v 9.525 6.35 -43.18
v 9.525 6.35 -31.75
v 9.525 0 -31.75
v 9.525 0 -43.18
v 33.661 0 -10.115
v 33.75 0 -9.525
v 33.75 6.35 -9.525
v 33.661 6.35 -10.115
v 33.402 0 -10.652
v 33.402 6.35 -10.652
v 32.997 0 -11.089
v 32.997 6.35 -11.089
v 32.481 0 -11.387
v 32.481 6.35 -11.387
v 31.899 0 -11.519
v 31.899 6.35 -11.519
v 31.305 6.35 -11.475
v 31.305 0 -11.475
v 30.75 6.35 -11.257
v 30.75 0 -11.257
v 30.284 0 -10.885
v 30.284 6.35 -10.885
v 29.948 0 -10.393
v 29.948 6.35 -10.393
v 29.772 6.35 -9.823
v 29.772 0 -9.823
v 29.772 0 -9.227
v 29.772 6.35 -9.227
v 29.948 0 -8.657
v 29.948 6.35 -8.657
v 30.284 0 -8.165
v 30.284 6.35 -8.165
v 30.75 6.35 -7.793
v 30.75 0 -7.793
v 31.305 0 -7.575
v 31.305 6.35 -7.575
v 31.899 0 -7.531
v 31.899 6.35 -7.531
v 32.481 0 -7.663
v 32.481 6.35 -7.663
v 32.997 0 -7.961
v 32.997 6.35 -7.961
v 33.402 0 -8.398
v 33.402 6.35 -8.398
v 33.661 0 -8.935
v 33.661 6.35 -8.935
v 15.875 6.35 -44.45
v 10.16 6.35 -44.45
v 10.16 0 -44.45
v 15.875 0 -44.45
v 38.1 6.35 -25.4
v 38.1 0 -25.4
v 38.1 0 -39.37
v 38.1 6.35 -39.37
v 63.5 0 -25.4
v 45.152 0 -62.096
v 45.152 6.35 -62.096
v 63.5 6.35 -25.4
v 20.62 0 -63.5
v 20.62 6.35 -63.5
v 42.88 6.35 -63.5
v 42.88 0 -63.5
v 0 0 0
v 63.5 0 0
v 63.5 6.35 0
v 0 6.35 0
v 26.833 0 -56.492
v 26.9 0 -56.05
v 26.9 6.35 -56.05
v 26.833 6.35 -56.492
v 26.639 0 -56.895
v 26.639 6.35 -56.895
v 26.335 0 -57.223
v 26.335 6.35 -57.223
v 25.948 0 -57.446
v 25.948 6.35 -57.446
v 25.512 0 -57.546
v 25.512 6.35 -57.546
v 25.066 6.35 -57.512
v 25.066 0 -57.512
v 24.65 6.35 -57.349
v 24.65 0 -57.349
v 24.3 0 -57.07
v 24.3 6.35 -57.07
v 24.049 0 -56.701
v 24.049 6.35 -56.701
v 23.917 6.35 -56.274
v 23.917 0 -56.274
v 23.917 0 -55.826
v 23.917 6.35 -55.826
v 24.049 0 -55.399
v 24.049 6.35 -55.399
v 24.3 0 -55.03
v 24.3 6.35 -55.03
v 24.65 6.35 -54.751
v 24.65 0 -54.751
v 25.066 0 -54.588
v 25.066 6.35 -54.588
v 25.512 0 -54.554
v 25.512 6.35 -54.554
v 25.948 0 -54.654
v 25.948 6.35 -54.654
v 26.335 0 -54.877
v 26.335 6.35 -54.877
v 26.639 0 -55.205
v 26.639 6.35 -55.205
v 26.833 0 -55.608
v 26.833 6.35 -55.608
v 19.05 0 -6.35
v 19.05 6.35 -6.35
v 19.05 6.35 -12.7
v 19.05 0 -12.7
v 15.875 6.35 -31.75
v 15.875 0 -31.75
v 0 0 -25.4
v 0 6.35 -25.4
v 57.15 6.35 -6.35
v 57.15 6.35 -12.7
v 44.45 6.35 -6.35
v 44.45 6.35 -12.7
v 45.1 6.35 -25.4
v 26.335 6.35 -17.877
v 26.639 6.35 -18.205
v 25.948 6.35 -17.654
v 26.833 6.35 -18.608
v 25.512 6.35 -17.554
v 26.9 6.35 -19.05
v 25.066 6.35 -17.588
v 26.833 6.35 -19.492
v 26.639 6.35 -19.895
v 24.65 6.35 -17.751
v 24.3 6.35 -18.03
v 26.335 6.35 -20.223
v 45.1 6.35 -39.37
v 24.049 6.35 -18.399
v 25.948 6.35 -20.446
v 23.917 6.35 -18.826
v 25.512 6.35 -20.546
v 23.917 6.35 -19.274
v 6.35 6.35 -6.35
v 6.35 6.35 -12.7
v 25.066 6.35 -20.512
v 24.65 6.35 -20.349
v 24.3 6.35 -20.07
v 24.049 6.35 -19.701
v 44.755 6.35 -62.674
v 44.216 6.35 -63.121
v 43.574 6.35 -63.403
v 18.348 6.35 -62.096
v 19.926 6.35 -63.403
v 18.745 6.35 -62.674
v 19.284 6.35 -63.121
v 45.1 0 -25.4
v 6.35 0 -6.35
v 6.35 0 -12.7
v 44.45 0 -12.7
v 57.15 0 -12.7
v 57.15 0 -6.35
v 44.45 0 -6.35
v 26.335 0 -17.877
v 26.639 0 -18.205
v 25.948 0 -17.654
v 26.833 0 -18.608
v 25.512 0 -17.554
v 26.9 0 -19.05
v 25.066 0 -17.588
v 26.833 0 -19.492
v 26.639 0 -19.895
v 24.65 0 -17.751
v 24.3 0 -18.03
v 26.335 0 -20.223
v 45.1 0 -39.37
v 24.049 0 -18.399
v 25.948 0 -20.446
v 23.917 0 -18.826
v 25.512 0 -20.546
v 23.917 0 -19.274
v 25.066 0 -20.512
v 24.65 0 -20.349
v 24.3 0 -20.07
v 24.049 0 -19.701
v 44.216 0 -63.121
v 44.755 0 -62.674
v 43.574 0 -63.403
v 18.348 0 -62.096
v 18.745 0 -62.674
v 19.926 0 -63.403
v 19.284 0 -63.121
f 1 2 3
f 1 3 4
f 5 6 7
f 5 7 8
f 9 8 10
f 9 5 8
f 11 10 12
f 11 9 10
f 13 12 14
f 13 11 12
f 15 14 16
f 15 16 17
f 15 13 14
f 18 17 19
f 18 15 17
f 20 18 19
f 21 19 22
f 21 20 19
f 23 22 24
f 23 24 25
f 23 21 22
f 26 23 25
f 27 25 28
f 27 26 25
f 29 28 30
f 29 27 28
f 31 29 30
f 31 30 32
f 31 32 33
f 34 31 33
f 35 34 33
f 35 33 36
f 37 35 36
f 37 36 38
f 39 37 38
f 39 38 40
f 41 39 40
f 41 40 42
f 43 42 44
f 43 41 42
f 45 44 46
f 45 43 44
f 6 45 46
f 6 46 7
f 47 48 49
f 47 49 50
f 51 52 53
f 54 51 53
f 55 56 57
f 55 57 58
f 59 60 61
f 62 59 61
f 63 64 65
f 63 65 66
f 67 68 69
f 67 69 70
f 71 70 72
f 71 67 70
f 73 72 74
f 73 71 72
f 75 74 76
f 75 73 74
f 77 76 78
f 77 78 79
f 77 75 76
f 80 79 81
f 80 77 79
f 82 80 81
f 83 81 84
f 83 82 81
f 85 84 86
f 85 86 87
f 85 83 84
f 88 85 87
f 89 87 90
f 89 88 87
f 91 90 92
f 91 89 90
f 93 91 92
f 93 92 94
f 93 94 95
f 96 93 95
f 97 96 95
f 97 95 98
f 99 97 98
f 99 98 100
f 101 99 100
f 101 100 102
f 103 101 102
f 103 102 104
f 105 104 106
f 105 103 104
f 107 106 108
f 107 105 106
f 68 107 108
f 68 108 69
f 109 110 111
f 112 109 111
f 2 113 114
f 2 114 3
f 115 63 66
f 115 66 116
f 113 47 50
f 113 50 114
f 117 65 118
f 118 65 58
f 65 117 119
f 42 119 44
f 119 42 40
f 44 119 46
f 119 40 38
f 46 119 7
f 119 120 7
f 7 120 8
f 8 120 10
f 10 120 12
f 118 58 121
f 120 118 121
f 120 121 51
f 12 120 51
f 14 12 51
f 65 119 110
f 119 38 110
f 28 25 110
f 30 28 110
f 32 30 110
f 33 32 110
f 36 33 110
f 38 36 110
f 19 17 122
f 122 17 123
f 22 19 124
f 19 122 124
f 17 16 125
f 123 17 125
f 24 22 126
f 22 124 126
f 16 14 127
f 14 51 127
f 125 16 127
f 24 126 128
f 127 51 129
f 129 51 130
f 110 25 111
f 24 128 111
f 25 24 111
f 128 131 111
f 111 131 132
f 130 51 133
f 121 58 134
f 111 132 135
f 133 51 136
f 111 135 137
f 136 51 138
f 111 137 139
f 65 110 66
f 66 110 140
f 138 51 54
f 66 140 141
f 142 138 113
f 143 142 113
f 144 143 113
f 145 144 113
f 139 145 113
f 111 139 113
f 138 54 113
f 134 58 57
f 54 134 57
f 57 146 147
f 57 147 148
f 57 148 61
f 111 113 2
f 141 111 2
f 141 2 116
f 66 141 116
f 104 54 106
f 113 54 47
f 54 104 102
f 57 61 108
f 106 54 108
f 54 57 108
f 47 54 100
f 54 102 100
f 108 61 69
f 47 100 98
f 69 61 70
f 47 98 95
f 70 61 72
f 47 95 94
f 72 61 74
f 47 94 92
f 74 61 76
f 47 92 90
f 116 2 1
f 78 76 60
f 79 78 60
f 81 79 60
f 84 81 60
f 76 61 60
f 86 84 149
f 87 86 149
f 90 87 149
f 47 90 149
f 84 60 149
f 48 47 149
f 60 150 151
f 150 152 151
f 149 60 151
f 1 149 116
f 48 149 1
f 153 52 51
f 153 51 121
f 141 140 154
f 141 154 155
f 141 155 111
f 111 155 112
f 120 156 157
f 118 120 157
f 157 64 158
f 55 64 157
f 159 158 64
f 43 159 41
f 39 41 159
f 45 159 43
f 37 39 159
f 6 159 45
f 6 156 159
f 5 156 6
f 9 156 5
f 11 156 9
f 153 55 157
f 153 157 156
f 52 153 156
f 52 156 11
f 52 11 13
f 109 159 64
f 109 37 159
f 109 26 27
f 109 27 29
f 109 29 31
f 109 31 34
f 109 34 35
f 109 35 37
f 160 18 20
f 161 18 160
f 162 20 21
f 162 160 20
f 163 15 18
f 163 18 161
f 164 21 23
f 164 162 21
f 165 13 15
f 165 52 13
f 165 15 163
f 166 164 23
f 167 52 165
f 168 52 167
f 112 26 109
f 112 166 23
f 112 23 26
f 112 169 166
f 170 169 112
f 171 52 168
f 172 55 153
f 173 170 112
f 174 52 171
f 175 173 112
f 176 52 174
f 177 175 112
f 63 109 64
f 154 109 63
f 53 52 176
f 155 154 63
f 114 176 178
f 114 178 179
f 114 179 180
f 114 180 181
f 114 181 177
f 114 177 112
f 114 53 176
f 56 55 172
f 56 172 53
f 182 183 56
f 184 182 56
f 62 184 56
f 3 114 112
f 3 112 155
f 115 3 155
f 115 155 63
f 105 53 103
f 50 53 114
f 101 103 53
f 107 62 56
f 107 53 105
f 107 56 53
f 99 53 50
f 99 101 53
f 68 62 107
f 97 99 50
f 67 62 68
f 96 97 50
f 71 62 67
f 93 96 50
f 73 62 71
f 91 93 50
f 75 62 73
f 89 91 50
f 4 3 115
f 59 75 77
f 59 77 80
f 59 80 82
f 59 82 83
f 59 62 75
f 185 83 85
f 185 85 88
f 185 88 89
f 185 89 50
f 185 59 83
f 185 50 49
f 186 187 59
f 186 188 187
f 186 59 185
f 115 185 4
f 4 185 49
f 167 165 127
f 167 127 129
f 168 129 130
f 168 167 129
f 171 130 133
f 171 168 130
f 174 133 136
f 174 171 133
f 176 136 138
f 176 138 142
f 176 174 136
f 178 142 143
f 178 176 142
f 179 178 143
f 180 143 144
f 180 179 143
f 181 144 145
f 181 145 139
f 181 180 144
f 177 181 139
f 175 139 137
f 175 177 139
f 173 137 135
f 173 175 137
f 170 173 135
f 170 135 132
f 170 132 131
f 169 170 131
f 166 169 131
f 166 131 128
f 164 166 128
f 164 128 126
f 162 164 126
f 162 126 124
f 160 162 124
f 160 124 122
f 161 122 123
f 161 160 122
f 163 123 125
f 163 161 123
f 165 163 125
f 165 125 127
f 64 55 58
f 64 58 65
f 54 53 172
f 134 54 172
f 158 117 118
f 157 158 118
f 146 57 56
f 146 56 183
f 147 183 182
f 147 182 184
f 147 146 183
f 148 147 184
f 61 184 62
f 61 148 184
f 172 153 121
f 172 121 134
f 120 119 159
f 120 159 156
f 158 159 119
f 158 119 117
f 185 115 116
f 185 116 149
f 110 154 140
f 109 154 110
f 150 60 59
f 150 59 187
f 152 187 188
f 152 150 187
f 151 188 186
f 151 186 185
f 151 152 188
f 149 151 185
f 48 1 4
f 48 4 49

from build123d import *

# Parameters (mm, degrees)
SKETCH2_R               = 2
SKETCH2_R_2             = 1.5
SKETCH2_W               = 12.7
SKETCH2_H               = 6.35
SKETCH2_W_2             = 7
SKETCH2_H_2             = 13.97
BOSS_EXTRUDE1_DEPTH     = 6.35
CUT_EXTRUDE7_DEPTH      = 6.35
CUT_EXTRUDE8_DEPTH      = 1
CUT_EXTRUDE8_DEPTH_BACK = 6.35
CUT_EXTRUDE_THIN1_DEPTH = 6.35


with BuildPart() as part:
    # Sketch2 → Boss-Extrude1 (new body)
    with BuildSketch(Plane(origin=(0, 0, 0), x_dir=(1, 0, 0), z_dir=(0, 1, 0))):
        Polygon((0, 25.4), (25.4, 76.2), (38.1, 76.2), (63.5, 25.4), (63.5, 0), (0, 0), align=None)
        with Locations((31.75, 9.525)):
            Circle(SKETCH2_R, mode=Mode.SUBTRACT)
        with Locations((25.4, 19.05)):
            Circle(SKETCH2_R_2, mode=Mode.SUBTRACT)
        with Locations((25.4, 56.05)):
            Circle(SKETCH2_R_2, mode=Mode.SUBTRACT)
        with Locations((12.7, 9.525)):
            Rectangle(SKETCH2_W, SKETCH2_H, mode=Mode.SUBTRACT)
        with Locations((50.8, 9.525)):
            Rectangle(SKETCH2_W, SKETCH2_H, mode=Mode.SUBTRACT)
        with Locations((41.6, 32.385)):
            Rectangle(SKETCH2_W_2, SKETCH2_H_2, mode=Mode.SUBTRACT)
    extrude(amount=BOSS_EXTRUDE1_DEPTH)

    # Sketch3 → Cut-Extrude7 (cut)
    with BuildSketch(Plane(origin=(0, 6.35, 0), x_dir=(1, 0, 0), z_dir=(0, 1, 0))):
        Polygon((10.16, 44.45), (15.875, 44.45), (15.875, 31.75), (9.525, 31.75), (9.525, 43.18), align=None)
    extrude(amount=-CUT_EXTRUDE7_DEPTH, mode=Mode.SUBTRACT)

    # Sketch4 → Cut-Extrude8 (cut, two sides)
    with BuildSketch(Plane(origin=(0, 6.35, 0), x_dir=(1, 0, 0), z_dir=(0, 1, 0))) as cut_extrude8_sk:
        Polygon((-145.97325632, 63.5), (19.05, 63.5), (44.45, 63.5), (209.47325632, 63.5), (209.47325632, 393.54651264), (-145.97325632, 393.54651264), align=None)
    extrude(amount=CUT_EXTRUDE8_DEPTH, mode=Mode.SUBTRACT)
    extrude(cut_extrude8_sk.sketch, amount=-CUT_EXTRUDE8_DEPTH_BACK, mode=Mode.SUBTRACT)

    # Sketch5 → Cut-Extrude-Thin1 (cut)
    with BuildSketch(Plane(origin=(0, 6.35, 0), x_dir=(1, 0, 0), z_dir=(0, 1, 0))):
        with BuildLine():
            ThreePointArc((45.152038734, 62.095922533), (44.215550693, 63.120653053), (42.880193669, 63.5))
            Line((42.880193669, 63.5), (42.880193669, 66.04))
            ThreePointArc((42.880193669, 66.04), (45.550907718, 65.281306106), (47.423883799, 63.231845065))
            Line((47.423883799, 63.231845065), (45.152038734, 62.095922533))
        make_face()
        with BuildLine():
            ThreePointArc((20.619806331, 63.5), (19.284449307, 63.120653053), (18.347961266, 62.095922533))
            Line((18.347961266, 62.095922533), (16.076116201, 63.231845065))
            ThreePointArc((16.076116201, 63.231845065), (17.949092282, 65.281306106), (20.619806331, 66.04))
            Line((20.619806331, 66.04), (20.619806331, 63.5))
        make_face()
    extrude(amount=-CUT_EXTRUDE_THIN1_DEPTH, mode=Mode.SUBTRACT)


solid = part.part
